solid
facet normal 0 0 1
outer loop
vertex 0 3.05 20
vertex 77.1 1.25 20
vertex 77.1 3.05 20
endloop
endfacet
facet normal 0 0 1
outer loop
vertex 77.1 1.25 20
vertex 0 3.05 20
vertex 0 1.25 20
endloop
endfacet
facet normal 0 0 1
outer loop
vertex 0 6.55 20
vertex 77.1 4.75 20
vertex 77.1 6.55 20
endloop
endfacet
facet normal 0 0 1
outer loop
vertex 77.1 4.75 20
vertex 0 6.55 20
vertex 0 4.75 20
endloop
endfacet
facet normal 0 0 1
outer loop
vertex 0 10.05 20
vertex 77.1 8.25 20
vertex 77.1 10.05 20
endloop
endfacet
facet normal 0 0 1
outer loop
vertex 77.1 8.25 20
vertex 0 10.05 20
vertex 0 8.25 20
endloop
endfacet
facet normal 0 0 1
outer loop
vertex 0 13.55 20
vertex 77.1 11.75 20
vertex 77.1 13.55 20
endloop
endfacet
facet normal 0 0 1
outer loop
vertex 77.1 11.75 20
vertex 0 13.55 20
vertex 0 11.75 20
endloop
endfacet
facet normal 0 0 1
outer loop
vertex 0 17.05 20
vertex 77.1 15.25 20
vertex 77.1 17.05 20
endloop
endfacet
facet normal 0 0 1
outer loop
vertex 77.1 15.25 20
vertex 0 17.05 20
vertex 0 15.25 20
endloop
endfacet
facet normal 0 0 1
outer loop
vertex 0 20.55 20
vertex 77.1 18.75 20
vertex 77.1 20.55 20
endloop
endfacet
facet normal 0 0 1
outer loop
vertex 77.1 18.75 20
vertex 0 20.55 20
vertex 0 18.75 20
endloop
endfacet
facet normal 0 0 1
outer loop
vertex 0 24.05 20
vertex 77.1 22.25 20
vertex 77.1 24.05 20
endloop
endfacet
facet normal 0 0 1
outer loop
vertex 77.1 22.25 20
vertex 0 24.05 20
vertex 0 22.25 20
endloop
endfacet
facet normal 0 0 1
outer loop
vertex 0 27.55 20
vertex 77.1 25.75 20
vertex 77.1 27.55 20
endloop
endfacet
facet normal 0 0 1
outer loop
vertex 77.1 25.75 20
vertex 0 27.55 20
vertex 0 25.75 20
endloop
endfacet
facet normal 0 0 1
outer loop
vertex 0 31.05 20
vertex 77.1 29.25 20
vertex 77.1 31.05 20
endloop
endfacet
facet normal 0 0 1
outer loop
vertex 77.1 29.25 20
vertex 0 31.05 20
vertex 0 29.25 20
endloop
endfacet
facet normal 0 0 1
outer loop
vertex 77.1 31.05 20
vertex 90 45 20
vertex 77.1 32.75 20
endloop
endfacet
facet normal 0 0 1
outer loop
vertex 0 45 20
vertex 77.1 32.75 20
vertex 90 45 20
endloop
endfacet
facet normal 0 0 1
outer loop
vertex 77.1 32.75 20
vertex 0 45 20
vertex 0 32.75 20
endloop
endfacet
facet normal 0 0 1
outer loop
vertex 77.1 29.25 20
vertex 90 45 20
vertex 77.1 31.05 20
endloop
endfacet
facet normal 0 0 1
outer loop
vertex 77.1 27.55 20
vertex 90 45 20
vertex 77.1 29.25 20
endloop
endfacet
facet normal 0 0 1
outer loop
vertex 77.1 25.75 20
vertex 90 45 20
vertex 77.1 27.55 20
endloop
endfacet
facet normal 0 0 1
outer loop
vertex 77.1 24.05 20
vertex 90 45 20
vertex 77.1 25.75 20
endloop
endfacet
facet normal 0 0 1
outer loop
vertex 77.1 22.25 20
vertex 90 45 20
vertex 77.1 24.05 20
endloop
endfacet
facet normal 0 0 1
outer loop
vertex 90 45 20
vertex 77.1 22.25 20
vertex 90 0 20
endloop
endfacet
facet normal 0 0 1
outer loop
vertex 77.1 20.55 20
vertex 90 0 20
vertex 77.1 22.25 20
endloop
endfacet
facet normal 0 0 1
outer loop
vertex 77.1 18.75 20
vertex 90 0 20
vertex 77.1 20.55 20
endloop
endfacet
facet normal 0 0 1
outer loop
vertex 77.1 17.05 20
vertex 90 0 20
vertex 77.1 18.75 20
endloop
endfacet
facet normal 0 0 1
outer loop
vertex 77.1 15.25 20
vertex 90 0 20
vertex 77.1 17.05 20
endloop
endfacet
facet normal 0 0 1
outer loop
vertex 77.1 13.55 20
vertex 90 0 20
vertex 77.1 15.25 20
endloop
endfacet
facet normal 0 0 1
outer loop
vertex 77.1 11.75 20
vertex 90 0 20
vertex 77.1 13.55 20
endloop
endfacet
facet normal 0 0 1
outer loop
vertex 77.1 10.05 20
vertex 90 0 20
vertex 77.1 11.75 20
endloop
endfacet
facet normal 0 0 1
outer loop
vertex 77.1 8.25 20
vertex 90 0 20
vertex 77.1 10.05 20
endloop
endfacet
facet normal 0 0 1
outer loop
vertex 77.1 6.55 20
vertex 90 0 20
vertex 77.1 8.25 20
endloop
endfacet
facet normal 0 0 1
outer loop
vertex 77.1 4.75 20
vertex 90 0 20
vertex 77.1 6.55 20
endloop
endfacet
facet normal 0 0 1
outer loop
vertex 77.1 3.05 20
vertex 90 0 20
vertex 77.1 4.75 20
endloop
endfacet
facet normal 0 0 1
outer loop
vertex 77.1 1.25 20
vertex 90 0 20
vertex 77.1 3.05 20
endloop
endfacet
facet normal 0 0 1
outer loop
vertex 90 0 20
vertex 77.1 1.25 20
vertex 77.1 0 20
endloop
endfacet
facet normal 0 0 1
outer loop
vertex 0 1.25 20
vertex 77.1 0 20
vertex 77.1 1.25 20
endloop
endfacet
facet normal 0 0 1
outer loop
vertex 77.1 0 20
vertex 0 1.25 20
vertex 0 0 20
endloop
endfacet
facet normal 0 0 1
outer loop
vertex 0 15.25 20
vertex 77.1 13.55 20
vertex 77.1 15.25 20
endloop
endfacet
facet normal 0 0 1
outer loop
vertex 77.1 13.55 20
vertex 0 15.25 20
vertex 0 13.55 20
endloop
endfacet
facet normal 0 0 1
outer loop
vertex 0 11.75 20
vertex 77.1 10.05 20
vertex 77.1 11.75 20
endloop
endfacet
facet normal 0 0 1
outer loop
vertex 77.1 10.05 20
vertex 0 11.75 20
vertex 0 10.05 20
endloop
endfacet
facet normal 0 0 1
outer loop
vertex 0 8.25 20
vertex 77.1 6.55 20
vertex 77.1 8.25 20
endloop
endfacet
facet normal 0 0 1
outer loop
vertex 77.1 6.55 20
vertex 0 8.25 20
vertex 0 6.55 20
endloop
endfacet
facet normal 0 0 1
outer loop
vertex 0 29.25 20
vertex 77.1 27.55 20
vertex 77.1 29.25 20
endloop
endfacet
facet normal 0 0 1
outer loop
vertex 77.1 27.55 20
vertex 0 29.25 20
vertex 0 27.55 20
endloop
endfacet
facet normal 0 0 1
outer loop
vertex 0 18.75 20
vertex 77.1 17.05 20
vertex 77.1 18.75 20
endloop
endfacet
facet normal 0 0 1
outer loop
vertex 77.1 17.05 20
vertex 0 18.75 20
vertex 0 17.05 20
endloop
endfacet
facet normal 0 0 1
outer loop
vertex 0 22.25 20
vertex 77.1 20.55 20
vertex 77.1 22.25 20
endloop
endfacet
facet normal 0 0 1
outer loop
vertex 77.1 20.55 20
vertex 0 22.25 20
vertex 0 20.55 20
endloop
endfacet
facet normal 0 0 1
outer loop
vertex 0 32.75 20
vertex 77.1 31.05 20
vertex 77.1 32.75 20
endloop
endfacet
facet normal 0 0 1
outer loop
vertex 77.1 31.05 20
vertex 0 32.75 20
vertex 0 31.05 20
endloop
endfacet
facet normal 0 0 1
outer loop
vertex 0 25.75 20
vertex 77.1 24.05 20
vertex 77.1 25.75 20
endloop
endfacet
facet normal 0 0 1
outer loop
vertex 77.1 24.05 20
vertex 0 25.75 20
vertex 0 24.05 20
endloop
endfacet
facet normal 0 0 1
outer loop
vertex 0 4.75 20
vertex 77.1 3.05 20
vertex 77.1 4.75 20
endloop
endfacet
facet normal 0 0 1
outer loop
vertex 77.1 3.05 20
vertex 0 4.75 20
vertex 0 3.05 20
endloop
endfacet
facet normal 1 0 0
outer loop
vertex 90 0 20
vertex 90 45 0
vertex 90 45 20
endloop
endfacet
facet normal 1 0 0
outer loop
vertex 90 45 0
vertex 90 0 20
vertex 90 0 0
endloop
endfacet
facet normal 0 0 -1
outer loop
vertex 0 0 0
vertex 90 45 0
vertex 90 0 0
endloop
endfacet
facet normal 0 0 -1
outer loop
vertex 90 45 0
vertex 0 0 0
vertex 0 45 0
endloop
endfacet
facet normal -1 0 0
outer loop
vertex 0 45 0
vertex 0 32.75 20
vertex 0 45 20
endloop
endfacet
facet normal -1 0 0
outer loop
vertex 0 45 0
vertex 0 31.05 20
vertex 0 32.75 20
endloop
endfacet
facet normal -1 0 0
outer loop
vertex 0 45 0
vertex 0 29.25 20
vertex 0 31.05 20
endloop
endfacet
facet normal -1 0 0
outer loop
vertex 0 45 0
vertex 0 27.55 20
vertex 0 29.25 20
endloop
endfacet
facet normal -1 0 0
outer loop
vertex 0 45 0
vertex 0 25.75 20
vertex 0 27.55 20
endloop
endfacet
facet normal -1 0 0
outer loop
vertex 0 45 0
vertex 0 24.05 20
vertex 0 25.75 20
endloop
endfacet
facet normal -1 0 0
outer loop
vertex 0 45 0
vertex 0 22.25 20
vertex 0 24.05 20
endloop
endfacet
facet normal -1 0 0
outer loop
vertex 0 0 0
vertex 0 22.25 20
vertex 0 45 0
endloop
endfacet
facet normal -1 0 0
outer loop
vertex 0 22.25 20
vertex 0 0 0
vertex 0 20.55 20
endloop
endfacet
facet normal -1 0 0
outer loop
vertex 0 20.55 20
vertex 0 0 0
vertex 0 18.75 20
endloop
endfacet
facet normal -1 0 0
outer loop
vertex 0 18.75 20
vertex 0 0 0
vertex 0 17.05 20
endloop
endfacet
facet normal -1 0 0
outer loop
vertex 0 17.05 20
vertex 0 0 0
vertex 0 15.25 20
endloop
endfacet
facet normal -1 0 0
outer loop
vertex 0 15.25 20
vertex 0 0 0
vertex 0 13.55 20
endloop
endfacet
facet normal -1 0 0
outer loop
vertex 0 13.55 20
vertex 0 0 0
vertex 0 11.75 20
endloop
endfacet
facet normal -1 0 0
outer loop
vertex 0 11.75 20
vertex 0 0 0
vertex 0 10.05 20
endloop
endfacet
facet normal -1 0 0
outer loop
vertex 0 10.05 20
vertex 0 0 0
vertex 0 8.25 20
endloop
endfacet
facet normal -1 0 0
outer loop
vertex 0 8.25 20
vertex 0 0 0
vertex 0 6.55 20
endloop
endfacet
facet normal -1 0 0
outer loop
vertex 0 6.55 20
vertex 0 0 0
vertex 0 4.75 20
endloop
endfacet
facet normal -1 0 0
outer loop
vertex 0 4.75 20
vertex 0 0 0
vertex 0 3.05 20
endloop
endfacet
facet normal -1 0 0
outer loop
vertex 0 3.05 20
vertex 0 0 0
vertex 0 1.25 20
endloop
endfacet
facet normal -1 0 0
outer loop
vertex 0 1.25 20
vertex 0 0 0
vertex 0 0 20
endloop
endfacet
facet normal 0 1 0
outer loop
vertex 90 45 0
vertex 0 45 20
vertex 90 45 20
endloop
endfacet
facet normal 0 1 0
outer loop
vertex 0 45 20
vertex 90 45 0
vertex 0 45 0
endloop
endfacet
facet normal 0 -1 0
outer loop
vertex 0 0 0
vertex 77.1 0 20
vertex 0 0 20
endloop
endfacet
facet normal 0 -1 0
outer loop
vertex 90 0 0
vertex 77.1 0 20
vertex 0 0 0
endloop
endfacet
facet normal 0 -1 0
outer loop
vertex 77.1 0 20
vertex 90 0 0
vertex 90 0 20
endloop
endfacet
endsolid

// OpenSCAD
// Drying Rack for 10 Microscope Slides
// Base: 90 x 45 x 20 mm
// Slots: 10 parallel slots along X, 77mm long, 1.6mm wide, 10mm deep
// Spacing: 3.5mm centre-to-centre in Y, centred on block

$fn = 128;

// Base Dimensions
base_length = 90;
base_width = 45;
base_height = 20;

// Slide Dimensions (for reference)
slide_length = 75;
slide_width = 25;
slide_thickness = 1;

// Slot Dimensions
slot_length = 77;
slot_width = 1.6;
slot_depth = 10;

// Layout Dimensions
slot_spacing = 3.5; // Centre-to-centre in Y
num_slots = 10;

// Calculate Y position of the first slot centre
// Total width of slots = num_slots * slot_width
// Total width of gaps = (num_slots - 1) * slot_spacing
// Remaining space to distribute on both sides = (base_width - total_slots - total_gaps) / 2
total_slot_width = num_slots * slot_width;
total_gap_width = (num_slots - 1) * slot_spacing;
offset_from_edge = (base_width - total_slot_width - total_gap_width) / 2;
first_slot_y = offset_from_edge + slot_width / 2;

// Build the solid block
difference() {
    // Main Block
    cube([base_length, base_width, base_height], center = false);
    
    // Cut Slots
    // Slots run along X, so we cut from the top face (Z = base_height) down to Z = base_height - slot_depth
    // We use a loop to generate the 10 slots
    for (i = [0 : num_slots - 1]) {
        // Calculate Y position for current slot
        y_pos = first_slot_y + (i * slot_spacing);
        
        // Define the slot geometry
        // The slot is a rectangular prism cut into the top
        translate([
            0,              // X position (runs full length, centred)
            y_pos,          // Y position
            base_height     // Z position (start at top surface)
        ]) {
            // Cut a block that is slightly larger than the slot to ensure clean cut
            // Extending 0.1mm past the faces as per rules
            difference() {
                // The cutting tool
                cube([
                    slot_length + 0.1,
                    slot_width + 0.1,
                    slot_depth + 0.1
                ]);
                
                // Optional: If we wanted to model the slot walls for visual inspection, 
                // we could intersect here, but for a clean cut, the simple cube works.
                // However, to strictly follow "extend past faces", the cube above does that.
            }
        }
    }
}
